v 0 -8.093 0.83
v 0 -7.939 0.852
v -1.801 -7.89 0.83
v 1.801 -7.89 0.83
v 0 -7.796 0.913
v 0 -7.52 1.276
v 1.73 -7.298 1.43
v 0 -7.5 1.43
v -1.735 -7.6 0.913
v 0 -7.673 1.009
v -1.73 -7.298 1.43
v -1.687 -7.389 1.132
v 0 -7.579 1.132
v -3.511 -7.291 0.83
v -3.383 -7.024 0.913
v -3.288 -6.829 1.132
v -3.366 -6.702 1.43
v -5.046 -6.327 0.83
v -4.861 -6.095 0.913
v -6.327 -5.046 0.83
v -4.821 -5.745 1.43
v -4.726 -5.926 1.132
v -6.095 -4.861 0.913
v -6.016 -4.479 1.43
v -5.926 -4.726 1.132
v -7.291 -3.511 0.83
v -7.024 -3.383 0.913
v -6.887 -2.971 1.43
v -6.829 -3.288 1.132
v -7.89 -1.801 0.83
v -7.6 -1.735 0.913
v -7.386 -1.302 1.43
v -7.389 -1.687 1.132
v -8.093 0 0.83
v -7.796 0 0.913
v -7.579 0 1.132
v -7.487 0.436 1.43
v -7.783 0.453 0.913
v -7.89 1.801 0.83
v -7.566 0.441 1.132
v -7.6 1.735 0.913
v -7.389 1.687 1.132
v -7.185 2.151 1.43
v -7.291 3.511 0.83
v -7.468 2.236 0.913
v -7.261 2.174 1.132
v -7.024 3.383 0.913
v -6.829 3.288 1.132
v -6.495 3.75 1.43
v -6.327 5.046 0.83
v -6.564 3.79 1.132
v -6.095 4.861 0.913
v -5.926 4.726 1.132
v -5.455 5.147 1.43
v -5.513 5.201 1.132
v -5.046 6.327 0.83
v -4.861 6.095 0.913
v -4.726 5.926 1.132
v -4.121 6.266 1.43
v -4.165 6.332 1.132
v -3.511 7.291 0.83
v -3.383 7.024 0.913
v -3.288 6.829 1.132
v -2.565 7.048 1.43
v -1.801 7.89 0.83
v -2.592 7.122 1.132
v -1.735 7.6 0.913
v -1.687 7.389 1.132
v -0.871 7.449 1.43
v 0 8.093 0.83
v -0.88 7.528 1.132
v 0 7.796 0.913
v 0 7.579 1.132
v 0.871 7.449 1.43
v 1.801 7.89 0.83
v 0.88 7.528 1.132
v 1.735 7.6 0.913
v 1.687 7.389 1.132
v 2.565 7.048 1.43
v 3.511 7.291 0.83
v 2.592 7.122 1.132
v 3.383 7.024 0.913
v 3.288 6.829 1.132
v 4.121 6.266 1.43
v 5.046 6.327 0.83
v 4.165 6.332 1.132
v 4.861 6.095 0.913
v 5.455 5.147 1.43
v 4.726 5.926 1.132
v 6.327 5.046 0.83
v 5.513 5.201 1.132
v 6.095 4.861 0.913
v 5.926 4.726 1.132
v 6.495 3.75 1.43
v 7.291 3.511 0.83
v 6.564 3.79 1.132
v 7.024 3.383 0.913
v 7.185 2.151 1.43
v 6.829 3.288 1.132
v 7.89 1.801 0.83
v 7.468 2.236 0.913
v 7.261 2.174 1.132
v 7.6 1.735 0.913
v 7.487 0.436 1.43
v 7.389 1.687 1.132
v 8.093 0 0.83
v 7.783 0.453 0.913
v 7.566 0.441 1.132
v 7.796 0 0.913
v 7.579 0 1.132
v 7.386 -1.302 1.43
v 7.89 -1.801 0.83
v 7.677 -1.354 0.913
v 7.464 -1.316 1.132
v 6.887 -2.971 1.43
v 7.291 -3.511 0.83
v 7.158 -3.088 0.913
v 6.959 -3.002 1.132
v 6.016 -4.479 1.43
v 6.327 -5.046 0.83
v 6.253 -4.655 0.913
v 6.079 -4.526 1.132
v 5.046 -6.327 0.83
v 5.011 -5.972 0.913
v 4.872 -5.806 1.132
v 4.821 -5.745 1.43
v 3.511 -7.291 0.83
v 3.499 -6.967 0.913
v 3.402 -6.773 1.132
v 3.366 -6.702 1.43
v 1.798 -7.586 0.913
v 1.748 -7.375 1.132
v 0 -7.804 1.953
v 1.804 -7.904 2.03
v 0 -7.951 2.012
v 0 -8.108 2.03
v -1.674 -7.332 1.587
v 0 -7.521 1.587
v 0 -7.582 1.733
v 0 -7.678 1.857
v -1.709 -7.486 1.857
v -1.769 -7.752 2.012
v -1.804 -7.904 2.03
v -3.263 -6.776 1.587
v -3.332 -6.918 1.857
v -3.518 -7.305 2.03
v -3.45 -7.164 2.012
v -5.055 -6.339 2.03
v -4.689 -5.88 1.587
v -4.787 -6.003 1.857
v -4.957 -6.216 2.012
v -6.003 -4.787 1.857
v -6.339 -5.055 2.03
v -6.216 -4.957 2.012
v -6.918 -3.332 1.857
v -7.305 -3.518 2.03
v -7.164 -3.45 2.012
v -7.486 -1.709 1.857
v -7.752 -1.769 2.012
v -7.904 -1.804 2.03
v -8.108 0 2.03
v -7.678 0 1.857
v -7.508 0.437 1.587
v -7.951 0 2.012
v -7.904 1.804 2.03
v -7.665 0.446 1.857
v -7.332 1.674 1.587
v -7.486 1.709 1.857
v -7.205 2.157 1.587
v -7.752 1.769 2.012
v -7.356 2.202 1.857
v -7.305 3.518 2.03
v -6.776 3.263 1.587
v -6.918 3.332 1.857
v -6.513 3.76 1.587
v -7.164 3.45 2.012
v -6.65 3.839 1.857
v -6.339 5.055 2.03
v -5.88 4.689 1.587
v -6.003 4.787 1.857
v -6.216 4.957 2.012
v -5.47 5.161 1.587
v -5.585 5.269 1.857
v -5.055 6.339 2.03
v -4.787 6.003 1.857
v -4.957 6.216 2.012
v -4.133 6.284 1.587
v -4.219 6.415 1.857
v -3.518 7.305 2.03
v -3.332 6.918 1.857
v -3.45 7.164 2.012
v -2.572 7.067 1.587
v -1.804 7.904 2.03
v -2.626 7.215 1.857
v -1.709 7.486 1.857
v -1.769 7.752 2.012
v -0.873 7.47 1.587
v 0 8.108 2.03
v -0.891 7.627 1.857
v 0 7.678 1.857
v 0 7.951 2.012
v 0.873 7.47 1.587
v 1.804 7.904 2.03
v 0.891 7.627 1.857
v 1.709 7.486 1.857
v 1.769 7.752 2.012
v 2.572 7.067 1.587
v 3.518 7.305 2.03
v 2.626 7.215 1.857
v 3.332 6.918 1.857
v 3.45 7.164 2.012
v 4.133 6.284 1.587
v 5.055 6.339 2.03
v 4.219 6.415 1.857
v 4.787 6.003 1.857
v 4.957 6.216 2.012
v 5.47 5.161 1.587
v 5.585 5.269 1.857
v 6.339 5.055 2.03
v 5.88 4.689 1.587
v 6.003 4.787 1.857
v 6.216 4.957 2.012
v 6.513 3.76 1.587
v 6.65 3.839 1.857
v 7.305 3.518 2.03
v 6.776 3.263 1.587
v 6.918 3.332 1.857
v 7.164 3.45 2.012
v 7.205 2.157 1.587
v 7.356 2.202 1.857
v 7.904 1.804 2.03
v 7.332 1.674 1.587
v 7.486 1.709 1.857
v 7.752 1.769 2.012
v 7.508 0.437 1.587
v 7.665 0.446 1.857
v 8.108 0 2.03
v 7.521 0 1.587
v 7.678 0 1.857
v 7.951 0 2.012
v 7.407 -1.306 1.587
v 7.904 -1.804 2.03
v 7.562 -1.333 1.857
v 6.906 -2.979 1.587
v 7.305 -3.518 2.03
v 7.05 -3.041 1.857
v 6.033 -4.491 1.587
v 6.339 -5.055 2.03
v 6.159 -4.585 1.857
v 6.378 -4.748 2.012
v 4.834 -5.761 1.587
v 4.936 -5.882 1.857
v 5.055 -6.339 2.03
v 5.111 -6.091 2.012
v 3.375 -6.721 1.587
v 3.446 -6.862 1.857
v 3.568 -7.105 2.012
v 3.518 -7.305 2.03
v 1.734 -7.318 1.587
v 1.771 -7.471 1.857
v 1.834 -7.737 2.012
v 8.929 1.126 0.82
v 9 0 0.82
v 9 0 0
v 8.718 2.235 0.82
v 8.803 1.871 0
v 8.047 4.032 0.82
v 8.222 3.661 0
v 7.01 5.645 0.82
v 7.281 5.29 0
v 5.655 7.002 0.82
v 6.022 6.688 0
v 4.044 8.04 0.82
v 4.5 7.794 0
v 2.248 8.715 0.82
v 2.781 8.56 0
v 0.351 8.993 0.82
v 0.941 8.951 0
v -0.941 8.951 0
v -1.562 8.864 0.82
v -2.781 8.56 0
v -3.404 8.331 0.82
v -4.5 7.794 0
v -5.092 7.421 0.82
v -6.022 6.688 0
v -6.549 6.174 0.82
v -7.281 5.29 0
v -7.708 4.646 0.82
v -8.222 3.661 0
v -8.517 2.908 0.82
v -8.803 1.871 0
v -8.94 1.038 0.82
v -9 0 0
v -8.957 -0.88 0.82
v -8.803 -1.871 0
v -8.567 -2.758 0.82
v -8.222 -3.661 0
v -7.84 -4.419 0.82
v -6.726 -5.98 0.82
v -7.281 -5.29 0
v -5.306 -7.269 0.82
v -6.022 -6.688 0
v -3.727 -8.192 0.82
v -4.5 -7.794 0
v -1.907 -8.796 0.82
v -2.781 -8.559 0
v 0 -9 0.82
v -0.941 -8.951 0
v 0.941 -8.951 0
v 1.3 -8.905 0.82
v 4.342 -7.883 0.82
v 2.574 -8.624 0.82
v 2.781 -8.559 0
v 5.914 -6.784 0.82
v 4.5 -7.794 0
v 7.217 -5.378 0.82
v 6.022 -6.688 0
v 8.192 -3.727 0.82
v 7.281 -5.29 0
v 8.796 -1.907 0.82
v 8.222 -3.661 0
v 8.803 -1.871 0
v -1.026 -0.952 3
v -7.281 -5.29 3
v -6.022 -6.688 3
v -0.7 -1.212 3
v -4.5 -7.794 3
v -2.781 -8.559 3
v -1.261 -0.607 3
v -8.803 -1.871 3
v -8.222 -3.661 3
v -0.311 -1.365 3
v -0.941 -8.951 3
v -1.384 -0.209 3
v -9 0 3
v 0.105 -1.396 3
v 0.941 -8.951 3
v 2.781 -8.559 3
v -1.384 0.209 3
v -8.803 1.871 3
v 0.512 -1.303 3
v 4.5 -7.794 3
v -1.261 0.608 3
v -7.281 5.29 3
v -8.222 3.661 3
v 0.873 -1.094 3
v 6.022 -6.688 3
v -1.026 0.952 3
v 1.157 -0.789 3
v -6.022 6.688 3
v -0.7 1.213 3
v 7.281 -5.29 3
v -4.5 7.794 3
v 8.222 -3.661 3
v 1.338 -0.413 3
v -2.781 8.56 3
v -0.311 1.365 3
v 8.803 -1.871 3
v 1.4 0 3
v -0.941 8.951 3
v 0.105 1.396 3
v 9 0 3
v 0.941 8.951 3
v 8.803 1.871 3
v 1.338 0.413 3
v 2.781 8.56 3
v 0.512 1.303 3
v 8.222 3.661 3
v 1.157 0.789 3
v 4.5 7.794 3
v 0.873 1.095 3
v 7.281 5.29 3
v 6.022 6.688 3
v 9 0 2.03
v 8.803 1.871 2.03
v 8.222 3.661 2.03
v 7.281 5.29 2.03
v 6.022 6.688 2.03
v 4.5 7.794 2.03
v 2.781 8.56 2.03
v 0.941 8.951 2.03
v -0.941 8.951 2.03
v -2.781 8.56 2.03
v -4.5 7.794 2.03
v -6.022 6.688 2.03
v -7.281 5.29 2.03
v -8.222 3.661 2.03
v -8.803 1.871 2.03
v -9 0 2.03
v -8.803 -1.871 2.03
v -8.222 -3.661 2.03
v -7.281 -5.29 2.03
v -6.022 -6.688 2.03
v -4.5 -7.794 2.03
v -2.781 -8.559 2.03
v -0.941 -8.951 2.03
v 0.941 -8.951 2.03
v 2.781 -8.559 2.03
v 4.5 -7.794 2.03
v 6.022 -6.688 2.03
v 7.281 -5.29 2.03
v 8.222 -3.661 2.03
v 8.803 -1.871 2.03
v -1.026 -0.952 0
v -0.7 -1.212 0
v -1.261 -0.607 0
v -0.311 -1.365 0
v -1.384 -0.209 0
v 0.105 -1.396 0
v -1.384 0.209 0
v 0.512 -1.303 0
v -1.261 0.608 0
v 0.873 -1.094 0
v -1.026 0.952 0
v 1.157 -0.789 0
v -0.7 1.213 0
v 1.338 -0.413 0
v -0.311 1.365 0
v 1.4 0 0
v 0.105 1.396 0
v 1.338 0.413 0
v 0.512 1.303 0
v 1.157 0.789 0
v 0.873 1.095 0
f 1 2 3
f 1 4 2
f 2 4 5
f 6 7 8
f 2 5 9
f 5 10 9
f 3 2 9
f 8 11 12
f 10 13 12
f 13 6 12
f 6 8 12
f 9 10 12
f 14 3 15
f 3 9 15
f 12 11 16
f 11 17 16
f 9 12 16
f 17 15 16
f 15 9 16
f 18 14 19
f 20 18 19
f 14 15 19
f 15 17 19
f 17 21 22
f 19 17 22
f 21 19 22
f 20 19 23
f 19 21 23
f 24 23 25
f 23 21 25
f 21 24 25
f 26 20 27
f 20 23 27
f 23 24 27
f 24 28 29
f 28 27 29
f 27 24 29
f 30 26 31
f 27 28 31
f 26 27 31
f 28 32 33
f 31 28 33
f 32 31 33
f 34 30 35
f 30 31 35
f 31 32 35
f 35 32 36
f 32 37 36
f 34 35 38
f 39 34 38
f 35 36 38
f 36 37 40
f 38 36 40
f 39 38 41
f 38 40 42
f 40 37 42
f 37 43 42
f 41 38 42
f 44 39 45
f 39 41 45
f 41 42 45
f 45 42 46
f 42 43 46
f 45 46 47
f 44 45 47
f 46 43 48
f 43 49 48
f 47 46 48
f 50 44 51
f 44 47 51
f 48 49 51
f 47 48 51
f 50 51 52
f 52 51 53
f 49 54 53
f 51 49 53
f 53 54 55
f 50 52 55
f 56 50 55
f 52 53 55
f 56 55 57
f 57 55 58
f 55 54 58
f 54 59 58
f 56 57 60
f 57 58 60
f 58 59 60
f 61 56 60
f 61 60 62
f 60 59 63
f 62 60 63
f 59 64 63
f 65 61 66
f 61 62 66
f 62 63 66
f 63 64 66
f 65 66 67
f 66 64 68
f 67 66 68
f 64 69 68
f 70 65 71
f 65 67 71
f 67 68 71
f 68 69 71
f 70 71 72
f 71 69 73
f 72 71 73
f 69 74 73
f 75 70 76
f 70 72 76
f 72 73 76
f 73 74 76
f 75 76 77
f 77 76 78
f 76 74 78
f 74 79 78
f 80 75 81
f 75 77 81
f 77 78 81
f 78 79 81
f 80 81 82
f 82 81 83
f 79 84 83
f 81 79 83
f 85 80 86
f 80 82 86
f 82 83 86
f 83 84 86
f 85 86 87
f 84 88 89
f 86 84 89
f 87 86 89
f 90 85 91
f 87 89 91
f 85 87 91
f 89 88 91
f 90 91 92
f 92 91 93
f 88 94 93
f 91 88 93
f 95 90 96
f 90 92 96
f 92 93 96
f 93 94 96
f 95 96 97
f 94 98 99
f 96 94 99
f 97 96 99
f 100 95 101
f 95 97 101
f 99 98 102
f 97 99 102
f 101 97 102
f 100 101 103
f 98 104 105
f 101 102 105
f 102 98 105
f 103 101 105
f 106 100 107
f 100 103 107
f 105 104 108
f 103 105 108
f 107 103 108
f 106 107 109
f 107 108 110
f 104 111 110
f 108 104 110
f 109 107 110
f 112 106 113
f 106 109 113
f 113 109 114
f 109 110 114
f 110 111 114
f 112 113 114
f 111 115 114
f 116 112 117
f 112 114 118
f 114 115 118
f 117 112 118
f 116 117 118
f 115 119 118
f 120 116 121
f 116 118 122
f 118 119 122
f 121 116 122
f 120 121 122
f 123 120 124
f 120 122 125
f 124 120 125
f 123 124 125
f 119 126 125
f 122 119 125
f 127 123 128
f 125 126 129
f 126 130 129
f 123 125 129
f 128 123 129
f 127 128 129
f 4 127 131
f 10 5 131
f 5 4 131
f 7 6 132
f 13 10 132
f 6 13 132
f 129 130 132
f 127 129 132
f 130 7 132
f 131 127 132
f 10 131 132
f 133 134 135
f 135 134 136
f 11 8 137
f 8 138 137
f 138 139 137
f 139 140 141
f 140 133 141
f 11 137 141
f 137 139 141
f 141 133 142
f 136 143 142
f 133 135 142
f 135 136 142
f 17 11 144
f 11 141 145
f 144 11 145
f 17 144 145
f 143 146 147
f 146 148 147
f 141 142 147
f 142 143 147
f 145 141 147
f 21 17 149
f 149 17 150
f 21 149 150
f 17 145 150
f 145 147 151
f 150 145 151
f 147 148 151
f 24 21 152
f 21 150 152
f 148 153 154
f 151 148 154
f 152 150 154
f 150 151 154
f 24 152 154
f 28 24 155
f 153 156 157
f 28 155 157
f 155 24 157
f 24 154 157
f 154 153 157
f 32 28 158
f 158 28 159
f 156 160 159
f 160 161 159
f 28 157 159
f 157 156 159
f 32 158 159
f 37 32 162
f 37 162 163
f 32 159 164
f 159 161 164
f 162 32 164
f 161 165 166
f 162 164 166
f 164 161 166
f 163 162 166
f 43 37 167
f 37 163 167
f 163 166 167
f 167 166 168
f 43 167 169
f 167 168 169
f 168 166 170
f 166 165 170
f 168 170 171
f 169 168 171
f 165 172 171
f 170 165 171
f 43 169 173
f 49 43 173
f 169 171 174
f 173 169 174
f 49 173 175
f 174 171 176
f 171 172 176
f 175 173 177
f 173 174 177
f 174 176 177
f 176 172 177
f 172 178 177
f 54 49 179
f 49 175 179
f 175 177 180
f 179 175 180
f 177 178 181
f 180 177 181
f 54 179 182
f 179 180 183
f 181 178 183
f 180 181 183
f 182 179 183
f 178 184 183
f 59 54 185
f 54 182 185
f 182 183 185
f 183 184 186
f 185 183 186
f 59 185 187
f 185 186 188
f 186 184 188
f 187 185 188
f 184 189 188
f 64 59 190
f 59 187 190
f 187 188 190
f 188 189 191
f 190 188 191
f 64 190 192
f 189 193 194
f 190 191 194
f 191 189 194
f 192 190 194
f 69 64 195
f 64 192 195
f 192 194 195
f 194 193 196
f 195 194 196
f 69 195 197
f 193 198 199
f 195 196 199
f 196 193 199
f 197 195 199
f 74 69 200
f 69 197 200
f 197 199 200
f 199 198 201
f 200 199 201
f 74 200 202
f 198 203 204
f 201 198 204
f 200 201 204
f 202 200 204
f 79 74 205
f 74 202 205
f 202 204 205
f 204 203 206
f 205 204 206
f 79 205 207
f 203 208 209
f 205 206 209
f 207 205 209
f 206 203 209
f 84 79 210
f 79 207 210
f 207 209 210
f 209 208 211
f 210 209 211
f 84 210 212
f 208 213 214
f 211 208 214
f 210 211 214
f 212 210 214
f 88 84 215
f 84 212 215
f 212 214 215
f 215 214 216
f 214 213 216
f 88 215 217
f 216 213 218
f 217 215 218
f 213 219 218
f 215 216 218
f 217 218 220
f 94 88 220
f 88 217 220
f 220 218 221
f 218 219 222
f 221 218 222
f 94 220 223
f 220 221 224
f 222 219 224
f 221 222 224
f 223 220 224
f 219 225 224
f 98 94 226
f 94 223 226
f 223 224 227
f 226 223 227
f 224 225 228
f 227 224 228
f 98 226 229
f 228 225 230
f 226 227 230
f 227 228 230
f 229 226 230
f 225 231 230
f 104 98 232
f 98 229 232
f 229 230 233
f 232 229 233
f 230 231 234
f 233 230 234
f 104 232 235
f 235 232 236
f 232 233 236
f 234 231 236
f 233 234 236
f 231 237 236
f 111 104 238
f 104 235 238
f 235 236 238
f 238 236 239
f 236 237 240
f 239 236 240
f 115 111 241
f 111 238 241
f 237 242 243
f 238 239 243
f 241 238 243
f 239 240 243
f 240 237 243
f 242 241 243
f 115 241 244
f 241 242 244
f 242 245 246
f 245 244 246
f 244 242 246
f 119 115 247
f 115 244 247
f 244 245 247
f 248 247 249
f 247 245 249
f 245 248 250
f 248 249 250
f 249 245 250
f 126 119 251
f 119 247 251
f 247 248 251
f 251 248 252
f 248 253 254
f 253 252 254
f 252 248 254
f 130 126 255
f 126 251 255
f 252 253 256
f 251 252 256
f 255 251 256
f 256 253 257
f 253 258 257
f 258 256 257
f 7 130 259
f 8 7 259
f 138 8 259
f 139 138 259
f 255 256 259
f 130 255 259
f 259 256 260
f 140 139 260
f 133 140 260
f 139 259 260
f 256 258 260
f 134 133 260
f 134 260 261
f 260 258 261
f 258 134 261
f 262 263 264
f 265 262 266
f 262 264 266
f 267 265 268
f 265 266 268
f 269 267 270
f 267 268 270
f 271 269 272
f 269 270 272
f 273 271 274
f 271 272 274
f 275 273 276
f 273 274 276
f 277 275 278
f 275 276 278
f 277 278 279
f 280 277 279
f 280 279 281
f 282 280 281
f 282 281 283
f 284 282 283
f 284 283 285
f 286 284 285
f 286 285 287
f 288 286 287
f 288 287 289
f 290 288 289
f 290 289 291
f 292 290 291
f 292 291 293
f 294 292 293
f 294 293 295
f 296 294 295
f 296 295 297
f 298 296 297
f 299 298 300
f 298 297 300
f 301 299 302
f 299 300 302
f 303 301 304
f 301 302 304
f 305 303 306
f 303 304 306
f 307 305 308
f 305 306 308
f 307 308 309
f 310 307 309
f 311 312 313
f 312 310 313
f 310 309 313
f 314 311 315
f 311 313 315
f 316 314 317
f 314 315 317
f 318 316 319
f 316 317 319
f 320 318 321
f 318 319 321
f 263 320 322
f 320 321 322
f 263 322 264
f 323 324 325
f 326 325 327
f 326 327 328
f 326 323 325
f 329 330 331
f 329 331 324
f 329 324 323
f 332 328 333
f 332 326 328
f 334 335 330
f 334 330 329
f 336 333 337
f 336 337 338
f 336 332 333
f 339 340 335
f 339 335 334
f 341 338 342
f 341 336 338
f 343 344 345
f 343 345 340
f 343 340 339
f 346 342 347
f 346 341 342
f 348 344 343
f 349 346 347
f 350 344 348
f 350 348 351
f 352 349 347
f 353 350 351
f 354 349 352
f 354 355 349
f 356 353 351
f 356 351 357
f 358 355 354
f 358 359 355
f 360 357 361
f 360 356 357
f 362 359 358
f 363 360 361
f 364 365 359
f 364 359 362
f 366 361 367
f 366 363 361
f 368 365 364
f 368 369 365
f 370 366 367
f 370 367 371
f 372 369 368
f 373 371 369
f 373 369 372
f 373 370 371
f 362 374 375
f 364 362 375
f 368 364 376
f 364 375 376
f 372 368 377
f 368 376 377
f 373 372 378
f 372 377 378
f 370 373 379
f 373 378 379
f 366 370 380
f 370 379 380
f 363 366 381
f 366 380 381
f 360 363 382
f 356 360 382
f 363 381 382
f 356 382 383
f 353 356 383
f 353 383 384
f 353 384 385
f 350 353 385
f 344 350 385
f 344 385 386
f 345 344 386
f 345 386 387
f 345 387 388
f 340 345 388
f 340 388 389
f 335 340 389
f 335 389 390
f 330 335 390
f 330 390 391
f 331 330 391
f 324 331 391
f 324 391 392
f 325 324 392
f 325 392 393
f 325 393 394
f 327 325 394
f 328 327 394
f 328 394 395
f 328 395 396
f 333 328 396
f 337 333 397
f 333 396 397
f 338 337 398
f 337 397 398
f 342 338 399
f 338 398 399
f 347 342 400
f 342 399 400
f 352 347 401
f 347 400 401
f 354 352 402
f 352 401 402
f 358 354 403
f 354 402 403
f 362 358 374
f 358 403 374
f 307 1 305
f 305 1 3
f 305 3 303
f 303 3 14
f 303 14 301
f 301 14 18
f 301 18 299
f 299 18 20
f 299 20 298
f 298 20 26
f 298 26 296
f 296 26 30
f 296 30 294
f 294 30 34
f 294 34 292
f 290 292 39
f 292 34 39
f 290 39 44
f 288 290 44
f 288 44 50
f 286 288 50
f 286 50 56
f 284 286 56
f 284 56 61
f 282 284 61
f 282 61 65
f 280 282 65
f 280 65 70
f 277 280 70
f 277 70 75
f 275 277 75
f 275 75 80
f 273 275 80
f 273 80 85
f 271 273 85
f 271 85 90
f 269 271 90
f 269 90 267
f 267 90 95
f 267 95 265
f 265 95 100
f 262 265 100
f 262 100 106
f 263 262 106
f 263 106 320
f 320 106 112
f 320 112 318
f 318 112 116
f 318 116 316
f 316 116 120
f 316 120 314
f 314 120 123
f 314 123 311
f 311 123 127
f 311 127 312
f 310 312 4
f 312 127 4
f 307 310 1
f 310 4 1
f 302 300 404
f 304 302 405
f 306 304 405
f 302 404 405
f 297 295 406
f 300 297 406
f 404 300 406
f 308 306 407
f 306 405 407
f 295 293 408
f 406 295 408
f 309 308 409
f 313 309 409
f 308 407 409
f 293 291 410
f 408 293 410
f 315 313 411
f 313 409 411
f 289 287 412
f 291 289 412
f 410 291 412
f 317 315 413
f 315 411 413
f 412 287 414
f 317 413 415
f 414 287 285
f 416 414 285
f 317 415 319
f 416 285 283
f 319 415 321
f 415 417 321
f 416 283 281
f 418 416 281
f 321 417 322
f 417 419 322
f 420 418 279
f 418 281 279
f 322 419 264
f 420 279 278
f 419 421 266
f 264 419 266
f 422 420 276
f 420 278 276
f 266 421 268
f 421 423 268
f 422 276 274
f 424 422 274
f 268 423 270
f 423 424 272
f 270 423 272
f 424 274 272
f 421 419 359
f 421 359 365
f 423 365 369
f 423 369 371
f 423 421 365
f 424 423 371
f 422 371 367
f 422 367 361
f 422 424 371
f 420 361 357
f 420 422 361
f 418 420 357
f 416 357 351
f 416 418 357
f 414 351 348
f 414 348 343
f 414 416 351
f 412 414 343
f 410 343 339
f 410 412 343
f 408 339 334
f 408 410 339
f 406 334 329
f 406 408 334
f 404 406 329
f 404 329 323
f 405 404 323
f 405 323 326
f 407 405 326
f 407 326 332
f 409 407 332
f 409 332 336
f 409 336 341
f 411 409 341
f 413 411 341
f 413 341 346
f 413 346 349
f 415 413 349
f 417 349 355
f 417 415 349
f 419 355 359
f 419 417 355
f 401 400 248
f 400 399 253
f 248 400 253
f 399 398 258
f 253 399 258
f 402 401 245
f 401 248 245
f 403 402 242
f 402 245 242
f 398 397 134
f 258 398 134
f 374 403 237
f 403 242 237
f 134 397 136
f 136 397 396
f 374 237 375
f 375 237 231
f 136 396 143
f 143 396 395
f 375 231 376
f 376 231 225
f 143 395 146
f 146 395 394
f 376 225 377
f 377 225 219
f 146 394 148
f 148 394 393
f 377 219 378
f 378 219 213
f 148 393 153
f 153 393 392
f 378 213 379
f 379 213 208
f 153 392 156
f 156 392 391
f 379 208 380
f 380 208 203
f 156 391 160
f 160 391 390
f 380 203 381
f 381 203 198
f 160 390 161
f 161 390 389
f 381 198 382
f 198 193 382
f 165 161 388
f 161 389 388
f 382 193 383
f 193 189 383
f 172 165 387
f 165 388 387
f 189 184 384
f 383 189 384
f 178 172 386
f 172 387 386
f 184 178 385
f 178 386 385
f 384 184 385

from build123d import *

# Parameters (mm, degrees)
F0_R     = 9
F0_R_2   = 1.4
F1_DEPTH = 3


with BuildPart() as f1:
    # F0 (on Top) → F1 (new body)
    with BuildSketch(Plane.XY):
        with Locations((-25.063416, 15.770752)):
            Circle(F0_R)
        with Locations((-25.063416, 15.770752)):
            Circle(F0_R_2, mode=Mode.SUBTRACT)
    extrude(amount=F1_DEPTH)


with BuildPart() as f1_1:
    # F3: moved
    add(f1.part.moved(Location((25.1714, 0, 0))))


with BuildPart() as f1_2:
    # F4: moved
    add(f1_1.part.moved(Location((-0.10792, -15.77066, 0))))

    # F2 (on Right) → F6 (revolve, cut)
    with BuildSketch(Plane.YZ):
        with BuildLine():
            ThreePointArc((-8.092892, 0.83043), (-7.67323, 1.008644), (-7.5, 1.430388))
            ThreePointArc((-7.5, 1.430388), (-7.678471, 1.857369), (-8.10771, 2.030338))
            ThreePointArc((-8.10771, 2.030338), (-8.699954, 1.422979), (-8.092892, 0.83043))
        make_face()
        with BuildLine():
            ThreePointArc((-8.092892, 0.83043), (-8.699954, 1.422979), (-8.10771, 2.030338))
            Line((-8.10771, 2.030338), (-10.503868, 2.030338))
            Line((-10.503868, 2.030338), (-10.503868, 0.801864))
            Line((-10.503868, 0.801864), (-8.092892, 0.83043))
        make_face()
    revolve(axis=Axis((0, 0, 1.962848), (0, 0, -1)), mode=Mode.SUBTRACT)


solid = f1_2.part
